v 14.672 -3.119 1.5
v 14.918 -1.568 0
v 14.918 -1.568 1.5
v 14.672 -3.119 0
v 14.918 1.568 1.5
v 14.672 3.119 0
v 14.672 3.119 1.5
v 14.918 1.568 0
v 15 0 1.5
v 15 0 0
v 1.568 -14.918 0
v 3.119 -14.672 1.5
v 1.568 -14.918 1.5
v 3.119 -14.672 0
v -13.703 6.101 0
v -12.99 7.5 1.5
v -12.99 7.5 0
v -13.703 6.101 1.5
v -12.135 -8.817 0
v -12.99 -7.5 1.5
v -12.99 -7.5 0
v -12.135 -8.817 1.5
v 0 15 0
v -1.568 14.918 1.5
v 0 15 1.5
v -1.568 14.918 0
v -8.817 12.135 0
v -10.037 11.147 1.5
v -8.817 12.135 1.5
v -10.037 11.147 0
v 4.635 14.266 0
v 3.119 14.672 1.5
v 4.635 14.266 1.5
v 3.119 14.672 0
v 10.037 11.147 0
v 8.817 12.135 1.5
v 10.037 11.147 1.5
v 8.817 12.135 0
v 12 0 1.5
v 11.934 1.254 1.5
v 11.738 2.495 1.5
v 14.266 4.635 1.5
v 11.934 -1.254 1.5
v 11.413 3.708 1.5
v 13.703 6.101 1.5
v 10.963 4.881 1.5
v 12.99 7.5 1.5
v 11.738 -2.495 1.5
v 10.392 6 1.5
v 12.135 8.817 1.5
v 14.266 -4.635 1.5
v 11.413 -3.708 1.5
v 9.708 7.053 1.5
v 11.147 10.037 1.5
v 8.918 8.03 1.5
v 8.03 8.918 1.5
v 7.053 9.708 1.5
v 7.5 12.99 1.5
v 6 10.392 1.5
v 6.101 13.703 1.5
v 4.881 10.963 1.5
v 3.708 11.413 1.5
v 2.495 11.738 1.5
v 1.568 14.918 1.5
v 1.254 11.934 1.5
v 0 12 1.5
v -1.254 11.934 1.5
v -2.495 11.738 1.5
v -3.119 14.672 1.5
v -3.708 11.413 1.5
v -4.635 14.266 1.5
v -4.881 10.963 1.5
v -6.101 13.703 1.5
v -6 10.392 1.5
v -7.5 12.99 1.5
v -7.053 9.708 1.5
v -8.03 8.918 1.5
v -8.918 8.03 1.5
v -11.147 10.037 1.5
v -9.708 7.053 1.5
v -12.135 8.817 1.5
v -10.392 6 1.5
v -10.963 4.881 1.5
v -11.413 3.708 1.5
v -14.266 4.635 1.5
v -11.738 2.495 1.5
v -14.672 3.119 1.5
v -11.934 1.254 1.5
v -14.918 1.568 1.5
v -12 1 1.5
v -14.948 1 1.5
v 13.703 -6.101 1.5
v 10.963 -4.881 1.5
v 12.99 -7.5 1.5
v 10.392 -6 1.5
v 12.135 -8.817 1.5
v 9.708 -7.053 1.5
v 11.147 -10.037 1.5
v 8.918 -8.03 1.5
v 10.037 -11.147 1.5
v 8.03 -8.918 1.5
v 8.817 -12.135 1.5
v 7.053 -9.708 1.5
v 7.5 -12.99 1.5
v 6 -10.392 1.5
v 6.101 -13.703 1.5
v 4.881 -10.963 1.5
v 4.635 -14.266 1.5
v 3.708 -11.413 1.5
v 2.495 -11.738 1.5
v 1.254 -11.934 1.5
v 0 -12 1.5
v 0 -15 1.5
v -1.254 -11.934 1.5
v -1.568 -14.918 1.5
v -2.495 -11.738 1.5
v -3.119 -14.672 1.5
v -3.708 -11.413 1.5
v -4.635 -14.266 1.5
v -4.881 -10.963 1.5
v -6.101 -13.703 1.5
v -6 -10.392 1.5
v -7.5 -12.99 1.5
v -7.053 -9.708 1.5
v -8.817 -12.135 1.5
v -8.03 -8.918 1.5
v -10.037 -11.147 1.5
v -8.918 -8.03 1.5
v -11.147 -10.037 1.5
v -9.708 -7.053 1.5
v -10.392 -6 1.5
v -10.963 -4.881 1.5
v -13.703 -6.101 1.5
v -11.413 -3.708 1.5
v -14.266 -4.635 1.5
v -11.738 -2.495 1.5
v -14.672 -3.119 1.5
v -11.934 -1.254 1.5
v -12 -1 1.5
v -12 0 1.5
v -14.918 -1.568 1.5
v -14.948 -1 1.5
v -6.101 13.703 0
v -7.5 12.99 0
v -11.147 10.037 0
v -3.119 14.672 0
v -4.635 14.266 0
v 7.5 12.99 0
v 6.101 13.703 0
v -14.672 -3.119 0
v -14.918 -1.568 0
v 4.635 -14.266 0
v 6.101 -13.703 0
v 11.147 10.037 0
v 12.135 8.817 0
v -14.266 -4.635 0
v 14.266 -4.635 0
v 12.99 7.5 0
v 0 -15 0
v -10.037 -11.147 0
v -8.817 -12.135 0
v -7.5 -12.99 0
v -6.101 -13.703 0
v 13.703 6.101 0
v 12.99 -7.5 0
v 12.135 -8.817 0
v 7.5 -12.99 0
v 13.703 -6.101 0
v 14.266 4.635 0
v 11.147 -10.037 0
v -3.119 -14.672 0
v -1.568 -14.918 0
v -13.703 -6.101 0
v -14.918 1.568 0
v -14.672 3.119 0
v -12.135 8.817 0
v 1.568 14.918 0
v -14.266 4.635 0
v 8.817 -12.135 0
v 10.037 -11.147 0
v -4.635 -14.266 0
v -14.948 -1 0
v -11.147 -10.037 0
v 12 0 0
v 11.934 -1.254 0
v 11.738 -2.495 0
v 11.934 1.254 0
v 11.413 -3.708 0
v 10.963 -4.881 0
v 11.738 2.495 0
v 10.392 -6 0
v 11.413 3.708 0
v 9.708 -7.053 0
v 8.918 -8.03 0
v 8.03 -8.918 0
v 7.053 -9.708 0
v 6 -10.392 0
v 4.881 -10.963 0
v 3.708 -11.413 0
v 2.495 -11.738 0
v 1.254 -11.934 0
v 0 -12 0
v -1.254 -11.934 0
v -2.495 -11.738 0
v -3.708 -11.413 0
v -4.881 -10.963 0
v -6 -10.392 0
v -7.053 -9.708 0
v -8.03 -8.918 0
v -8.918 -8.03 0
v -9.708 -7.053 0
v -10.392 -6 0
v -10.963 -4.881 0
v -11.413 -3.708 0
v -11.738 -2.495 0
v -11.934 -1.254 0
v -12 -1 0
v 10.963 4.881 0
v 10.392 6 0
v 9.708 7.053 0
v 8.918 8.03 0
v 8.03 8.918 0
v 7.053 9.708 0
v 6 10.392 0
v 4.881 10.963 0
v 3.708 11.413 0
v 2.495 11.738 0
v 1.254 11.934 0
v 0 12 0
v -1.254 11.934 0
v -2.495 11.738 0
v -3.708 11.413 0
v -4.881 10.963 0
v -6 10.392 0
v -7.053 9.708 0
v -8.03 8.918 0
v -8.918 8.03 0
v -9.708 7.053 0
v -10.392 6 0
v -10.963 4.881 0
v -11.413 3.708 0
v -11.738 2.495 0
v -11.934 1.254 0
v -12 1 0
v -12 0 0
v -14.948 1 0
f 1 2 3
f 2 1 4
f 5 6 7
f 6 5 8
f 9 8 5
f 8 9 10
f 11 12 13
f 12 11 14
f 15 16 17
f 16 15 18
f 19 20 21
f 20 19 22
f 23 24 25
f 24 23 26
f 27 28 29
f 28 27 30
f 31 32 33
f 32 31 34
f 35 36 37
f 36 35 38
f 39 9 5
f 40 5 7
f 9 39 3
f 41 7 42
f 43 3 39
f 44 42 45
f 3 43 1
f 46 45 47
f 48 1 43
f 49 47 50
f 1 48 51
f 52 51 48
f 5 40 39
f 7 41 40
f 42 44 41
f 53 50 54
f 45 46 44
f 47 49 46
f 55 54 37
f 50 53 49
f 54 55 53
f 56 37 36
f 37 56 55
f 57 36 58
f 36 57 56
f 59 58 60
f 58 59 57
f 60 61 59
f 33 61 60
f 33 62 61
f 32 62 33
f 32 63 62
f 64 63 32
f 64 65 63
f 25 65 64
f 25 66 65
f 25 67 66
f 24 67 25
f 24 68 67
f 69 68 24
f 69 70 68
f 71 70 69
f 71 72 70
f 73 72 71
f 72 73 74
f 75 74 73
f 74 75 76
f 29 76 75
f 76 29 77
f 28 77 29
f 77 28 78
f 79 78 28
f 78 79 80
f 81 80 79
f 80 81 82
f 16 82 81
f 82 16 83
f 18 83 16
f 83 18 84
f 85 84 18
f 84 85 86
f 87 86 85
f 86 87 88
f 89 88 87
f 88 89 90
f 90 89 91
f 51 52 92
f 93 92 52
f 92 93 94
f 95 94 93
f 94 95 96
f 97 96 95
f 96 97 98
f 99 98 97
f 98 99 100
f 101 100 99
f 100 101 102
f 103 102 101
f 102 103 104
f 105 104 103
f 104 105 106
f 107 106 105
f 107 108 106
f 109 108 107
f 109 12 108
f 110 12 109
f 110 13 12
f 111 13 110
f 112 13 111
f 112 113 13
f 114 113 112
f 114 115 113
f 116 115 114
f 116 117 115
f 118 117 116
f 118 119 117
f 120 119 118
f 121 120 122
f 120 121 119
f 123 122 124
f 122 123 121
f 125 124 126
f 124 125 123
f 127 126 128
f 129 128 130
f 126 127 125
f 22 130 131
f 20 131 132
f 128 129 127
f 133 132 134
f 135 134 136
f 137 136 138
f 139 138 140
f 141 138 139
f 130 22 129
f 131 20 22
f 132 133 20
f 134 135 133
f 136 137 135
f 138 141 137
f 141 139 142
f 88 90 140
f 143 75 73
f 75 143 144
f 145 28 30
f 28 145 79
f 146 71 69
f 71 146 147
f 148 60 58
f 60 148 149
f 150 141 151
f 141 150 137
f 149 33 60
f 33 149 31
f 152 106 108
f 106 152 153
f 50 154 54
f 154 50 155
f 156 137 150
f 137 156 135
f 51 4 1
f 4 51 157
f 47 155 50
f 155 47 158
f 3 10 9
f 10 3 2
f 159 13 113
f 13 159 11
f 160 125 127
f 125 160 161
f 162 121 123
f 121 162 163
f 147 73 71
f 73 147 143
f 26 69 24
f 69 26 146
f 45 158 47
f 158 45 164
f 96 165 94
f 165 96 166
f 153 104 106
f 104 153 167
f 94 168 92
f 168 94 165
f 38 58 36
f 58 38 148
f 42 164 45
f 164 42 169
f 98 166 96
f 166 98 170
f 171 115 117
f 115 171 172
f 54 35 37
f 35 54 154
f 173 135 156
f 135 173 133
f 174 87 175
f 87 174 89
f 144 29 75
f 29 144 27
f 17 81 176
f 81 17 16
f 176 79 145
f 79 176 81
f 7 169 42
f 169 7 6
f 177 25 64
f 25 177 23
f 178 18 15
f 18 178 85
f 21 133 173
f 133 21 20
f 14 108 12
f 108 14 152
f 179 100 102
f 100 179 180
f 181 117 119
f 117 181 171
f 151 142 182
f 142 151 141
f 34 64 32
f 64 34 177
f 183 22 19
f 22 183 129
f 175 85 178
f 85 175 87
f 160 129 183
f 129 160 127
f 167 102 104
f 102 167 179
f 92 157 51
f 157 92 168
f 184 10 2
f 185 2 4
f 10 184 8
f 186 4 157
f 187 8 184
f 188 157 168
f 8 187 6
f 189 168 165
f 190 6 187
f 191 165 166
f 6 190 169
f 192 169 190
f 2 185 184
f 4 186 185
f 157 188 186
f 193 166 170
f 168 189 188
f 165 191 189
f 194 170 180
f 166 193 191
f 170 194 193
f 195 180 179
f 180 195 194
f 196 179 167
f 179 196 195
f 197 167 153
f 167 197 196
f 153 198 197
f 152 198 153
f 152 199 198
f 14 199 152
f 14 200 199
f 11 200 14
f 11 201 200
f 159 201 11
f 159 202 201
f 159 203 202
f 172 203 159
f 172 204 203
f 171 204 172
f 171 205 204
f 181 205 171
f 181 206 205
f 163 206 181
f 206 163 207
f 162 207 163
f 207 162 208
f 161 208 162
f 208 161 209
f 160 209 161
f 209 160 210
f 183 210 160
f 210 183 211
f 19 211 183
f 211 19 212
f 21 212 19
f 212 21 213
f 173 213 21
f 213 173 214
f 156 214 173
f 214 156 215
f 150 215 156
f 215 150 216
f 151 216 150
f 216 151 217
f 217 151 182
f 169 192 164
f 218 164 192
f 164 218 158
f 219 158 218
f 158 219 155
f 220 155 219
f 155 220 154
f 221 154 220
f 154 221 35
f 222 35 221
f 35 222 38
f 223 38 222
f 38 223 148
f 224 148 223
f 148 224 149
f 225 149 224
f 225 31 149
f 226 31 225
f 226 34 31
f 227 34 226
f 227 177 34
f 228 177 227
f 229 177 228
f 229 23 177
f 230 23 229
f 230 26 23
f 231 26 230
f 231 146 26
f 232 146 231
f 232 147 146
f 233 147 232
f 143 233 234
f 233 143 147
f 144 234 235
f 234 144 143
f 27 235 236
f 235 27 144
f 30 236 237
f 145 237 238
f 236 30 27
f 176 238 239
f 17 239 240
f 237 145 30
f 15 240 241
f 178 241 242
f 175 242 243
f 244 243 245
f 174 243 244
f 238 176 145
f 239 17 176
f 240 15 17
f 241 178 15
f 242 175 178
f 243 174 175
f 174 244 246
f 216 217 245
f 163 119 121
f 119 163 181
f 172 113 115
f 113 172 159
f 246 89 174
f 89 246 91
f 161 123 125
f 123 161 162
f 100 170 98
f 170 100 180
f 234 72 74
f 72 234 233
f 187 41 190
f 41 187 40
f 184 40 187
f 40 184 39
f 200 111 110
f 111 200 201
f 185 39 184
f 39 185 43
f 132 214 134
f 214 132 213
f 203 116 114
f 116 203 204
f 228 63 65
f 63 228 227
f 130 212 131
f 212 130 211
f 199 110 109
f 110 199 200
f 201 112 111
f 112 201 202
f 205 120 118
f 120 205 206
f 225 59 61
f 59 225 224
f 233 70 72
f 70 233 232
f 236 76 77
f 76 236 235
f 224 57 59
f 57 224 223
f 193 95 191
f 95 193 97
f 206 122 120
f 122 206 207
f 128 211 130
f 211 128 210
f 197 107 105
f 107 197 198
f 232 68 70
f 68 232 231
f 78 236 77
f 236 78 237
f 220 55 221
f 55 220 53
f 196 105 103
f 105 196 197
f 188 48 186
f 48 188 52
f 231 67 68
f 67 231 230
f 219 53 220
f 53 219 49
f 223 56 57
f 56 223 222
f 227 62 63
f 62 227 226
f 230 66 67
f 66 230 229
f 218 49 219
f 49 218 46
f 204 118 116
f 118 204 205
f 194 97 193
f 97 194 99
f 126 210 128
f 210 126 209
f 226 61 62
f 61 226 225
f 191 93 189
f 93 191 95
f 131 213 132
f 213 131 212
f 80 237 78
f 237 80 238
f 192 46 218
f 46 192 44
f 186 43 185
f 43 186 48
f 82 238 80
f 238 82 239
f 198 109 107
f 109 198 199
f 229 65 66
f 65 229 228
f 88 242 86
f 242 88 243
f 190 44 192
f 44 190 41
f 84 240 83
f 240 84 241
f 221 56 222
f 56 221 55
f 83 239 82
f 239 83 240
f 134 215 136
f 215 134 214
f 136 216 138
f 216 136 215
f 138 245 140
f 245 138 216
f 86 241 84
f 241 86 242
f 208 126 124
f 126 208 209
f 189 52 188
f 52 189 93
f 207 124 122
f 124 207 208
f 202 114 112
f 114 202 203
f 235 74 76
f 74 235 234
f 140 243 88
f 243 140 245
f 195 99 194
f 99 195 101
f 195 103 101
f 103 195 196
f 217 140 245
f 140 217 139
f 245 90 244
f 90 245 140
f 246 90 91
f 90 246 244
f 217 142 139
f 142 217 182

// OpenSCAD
// Internal retaining ring.
$fn = 60;
eps = 0.02;
inner_d = 24;
outer_d = 30;
thickness = max(1.5, 1.5);
difference() { cylinder(d=outer_d,h=thickness); translate([0,0,-eps]) cylinder(d=inner_d,h=thickness+2*eps); translate([-outer_d/2-eps,-1,-eps]) cube([outer_d/2-inner_d/2+eps,2,thickness+2*eps]); }
